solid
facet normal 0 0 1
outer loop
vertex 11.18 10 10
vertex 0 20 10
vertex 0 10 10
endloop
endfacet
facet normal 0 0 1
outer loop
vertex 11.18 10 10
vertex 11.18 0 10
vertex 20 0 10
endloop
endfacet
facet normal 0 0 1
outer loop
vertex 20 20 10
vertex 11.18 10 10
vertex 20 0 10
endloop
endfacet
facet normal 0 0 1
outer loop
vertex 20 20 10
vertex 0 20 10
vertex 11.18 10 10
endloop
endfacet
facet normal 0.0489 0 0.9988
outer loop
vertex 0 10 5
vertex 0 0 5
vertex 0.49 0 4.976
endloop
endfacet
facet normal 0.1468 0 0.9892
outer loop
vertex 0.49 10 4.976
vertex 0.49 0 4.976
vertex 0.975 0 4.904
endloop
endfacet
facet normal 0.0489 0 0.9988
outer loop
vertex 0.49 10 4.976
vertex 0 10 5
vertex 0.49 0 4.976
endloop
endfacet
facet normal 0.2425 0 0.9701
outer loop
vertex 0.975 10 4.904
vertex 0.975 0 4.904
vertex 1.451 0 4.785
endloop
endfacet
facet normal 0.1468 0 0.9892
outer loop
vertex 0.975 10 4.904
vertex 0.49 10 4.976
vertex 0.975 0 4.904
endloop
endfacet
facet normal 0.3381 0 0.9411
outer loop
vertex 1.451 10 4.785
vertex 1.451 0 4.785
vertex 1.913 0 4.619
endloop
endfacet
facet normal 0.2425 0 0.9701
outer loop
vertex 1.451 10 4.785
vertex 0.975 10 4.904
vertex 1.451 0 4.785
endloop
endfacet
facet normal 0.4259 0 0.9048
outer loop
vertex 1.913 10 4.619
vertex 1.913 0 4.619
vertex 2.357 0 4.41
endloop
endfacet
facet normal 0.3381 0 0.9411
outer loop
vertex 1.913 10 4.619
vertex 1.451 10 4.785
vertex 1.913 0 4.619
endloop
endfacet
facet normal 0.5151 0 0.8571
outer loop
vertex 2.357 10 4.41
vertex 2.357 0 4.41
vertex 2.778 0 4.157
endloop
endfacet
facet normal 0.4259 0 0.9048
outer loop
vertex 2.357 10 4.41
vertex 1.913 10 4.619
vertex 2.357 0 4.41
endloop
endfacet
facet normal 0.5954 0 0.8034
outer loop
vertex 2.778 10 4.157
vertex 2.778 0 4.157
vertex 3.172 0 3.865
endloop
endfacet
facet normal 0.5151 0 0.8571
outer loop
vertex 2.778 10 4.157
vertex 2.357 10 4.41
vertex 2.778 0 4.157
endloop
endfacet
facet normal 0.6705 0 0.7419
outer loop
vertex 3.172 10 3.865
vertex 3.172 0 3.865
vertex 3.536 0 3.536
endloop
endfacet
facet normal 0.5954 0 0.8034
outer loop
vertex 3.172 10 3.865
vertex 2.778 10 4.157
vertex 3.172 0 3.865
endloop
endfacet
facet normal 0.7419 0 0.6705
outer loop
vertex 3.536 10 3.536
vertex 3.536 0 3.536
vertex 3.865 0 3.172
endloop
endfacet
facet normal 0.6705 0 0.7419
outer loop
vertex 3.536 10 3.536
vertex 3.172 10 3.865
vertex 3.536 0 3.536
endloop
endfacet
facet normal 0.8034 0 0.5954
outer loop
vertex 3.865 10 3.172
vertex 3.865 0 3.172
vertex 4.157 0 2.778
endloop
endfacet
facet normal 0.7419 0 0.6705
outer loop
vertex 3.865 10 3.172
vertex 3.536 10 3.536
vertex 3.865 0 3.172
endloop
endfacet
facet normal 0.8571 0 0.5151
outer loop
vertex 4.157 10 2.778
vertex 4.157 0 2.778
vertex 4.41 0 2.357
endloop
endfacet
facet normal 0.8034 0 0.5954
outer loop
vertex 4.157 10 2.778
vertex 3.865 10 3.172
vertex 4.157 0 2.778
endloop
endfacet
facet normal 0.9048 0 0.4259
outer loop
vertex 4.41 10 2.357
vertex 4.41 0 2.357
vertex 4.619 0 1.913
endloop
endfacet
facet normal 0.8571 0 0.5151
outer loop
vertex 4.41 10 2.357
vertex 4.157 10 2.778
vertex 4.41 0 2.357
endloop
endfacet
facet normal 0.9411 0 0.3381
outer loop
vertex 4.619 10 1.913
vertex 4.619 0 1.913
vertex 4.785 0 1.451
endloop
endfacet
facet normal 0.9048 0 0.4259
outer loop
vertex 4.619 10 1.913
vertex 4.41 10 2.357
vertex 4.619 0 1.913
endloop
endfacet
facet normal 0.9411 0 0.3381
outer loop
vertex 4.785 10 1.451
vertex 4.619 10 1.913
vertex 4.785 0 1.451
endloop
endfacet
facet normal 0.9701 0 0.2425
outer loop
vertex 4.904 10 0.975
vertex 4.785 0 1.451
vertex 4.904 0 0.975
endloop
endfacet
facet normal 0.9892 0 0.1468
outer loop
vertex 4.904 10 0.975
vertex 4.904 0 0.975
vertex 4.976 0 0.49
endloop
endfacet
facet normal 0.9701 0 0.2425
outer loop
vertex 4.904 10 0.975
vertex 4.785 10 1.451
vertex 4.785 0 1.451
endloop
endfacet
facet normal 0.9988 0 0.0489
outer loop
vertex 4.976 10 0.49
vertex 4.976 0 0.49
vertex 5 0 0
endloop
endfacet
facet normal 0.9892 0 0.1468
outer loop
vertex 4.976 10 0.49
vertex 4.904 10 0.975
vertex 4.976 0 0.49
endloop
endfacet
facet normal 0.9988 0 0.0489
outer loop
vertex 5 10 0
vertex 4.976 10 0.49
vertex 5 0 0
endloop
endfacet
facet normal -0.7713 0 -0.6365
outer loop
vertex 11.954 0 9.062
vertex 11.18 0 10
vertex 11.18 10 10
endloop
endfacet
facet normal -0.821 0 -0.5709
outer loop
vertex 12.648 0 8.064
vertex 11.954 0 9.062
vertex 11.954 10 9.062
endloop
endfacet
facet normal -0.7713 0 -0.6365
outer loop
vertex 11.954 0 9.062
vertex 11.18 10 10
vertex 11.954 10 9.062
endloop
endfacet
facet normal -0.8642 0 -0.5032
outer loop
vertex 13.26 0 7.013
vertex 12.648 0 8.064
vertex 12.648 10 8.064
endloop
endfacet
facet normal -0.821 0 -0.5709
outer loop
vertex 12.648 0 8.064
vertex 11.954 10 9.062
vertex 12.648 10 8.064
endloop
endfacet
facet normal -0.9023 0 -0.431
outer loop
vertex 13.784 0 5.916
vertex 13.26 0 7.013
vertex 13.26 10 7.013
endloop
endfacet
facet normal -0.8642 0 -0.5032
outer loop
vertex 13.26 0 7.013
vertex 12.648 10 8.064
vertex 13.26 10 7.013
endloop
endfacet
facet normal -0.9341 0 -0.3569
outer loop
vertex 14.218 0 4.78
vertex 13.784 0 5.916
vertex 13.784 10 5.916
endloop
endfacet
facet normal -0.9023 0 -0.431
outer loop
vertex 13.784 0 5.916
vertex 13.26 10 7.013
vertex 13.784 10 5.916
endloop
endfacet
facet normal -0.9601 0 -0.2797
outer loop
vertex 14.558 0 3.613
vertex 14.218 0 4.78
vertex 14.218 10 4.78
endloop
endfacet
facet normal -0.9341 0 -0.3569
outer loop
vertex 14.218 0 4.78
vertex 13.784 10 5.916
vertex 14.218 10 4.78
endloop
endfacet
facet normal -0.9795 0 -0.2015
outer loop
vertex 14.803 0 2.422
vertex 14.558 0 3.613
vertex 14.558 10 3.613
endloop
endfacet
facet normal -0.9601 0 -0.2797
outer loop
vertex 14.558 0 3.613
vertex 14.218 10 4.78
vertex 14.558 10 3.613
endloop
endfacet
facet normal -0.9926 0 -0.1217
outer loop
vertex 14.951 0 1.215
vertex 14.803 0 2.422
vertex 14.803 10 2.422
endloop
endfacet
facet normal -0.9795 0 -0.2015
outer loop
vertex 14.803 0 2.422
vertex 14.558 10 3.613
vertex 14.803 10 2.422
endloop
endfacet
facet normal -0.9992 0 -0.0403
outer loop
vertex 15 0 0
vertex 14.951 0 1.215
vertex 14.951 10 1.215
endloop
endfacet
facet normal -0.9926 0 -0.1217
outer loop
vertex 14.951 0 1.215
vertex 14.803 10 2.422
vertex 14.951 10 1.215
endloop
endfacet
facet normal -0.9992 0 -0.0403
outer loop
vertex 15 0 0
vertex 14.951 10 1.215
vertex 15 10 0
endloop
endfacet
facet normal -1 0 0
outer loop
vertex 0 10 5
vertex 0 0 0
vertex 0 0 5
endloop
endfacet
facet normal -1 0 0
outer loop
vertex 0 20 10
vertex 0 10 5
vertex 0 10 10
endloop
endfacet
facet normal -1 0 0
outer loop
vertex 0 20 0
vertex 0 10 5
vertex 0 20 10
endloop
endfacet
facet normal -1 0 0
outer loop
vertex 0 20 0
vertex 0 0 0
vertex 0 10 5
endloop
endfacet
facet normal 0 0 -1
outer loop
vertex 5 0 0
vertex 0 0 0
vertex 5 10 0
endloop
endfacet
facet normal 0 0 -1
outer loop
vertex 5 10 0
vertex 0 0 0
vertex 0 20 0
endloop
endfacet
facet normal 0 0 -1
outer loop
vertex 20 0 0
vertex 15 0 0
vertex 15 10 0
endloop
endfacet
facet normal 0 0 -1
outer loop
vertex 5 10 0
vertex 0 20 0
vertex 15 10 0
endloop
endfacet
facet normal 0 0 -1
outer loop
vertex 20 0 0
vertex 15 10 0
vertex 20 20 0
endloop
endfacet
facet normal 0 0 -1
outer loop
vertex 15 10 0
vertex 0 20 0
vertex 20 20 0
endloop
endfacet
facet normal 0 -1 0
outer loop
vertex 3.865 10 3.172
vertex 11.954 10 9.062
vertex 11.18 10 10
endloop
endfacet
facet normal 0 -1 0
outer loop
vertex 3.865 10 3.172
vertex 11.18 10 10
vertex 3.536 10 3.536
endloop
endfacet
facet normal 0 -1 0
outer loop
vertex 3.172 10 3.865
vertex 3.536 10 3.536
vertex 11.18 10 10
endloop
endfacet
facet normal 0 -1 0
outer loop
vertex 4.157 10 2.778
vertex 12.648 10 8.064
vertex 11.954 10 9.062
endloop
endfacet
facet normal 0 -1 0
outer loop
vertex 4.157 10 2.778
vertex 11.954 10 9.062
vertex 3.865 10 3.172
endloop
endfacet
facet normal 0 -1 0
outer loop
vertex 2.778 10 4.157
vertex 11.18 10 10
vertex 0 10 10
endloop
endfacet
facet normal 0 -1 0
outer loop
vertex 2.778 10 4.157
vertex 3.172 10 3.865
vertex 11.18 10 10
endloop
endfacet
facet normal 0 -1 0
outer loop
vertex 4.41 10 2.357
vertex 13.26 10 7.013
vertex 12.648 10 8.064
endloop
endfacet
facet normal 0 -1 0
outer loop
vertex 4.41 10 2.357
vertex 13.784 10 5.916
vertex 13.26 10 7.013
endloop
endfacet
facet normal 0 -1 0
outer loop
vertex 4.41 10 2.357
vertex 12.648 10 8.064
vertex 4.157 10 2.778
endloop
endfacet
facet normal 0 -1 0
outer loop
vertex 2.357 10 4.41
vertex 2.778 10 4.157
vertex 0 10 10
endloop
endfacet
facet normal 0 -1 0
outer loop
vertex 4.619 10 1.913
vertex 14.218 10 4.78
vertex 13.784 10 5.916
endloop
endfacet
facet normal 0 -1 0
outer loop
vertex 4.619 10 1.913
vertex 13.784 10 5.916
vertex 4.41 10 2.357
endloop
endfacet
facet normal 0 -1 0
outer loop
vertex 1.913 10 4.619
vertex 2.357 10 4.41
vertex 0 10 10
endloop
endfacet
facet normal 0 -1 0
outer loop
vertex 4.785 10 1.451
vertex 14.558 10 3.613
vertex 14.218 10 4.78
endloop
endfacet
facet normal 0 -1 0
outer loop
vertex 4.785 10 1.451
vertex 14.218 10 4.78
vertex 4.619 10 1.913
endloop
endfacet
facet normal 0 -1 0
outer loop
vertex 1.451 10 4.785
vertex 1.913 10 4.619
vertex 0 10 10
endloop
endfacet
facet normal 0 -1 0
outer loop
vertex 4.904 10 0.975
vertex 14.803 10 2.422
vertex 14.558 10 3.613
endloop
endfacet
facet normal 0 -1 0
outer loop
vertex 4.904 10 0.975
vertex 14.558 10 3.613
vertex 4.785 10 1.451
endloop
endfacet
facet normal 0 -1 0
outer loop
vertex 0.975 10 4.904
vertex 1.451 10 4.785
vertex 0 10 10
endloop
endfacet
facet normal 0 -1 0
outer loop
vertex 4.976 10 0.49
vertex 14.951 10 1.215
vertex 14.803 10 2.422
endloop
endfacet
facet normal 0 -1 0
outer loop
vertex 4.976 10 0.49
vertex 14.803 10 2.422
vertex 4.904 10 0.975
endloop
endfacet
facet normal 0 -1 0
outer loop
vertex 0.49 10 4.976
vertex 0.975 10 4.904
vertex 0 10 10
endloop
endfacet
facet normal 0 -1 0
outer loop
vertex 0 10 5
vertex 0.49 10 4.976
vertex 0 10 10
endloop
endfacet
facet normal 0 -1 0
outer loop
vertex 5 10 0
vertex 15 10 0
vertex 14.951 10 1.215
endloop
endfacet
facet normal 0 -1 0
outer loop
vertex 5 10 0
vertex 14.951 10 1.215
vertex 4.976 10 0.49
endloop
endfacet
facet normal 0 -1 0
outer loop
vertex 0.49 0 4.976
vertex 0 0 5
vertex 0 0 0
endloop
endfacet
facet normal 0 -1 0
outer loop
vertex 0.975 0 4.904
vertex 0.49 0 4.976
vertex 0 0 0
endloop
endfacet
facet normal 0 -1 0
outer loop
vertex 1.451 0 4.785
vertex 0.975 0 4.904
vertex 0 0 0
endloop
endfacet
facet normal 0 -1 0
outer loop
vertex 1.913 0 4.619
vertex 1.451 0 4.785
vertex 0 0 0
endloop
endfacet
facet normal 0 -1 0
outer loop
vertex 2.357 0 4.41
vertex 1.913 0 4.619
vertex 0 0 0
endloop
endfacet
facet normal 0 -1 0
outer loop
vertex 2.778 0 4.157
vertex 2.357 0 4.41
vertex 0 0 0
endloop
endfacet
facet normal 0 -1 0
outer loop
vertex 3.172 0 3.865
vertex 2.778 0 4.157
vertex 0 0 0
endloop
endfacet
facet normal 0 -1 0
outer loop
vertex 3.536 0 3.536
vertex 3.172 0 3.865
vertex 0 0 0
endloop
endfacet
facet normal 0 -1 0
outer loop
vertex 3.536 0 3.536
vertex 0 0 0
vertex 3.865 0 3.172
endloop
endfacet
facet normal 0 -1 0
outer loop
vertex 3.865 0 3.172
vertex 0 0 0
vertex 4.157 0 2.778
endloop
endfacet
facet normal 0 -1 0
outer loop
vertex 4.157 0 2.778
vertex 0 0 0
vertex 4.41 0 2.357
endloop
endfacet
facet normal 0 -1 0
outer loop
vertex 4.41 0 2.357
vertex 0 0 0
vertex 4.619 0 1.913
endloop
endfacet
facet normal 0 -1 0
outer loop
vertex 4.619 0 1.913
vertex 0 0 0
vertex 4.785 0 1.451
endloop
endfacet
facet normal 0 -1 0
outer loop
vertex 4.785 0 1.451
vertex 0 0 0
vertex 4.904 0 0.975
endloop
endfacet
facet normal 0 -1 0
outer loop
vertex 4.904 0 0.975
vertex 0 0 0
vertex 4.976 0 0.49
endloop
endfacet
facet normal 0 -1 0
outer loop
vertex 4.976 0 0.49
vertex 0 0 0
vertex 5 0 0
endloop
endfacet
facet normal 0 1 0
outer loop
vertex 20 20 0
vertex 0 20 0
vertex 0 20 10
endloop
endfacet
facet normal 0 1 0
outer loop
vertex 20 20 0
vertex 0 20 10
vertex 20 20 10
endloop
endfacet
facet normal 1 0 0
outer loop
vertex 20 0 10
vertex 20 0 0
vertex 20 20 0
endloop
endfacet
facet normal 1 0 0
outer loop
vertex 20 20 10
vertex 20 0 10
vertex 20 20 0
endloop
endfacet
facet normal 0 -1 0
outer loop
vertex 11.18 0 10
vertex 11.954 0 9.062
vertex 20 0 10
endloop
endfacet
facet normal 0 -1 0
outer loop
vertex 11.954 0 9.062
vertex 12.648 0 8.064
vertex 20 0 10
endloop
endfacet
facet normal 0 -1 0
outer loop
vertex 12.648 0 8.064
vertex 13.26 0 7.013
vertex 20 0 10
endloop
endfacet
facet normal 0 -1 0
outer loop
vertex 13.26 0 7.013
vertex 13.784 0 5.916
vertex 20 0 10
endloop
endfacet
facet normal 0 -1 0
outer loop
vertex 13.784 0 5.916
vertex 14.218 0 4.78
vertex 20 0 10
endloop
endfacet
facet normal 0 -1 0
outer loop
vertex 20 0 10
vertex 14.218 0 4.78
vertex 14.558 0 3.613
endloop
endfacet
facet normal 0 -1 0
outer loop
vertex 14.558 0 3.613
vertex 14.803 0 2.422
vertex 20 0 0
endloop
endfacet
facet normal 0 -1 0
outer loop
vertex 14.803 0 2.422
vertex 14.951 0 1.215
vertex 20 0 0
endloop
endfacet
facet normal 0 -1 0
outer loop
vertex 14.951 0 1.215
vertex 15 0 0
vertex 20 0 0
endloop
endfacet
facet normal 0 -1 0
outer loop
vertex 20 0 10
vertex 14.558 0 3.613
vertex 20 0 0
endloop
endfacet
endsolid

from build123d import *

# Parameters (mm, degrees)
SKETCH_1_W    = 20
SKETCH_1_H    = 20
BASEBOX_DEPTH = 10
SKETCH_2_W    = 10
SKETCH_2_H    = 10


with BuildPart() as part:
    # 草图1 → BaseBox (new body)
    with BuildSketch(Plane.XY):
        with Locations((10, 10)):
            Rectangle(SKETCH_1_W, SKETCH_1_H)
    extrude(amount=BASEBOX_DEPTH)

    # 草图2 → RevolveCut360 (revolve, cut)
    with BuildSketch(Plane.XY):
        with Locations((10, 5)):
            Rectangle(SKETCH_2_W, SKETCH_2_H)
    revolve(axis=Axis((0, 0, 0), (0, 1, 0)), mode=Mode.SUBTRACT)


solid = part.part
